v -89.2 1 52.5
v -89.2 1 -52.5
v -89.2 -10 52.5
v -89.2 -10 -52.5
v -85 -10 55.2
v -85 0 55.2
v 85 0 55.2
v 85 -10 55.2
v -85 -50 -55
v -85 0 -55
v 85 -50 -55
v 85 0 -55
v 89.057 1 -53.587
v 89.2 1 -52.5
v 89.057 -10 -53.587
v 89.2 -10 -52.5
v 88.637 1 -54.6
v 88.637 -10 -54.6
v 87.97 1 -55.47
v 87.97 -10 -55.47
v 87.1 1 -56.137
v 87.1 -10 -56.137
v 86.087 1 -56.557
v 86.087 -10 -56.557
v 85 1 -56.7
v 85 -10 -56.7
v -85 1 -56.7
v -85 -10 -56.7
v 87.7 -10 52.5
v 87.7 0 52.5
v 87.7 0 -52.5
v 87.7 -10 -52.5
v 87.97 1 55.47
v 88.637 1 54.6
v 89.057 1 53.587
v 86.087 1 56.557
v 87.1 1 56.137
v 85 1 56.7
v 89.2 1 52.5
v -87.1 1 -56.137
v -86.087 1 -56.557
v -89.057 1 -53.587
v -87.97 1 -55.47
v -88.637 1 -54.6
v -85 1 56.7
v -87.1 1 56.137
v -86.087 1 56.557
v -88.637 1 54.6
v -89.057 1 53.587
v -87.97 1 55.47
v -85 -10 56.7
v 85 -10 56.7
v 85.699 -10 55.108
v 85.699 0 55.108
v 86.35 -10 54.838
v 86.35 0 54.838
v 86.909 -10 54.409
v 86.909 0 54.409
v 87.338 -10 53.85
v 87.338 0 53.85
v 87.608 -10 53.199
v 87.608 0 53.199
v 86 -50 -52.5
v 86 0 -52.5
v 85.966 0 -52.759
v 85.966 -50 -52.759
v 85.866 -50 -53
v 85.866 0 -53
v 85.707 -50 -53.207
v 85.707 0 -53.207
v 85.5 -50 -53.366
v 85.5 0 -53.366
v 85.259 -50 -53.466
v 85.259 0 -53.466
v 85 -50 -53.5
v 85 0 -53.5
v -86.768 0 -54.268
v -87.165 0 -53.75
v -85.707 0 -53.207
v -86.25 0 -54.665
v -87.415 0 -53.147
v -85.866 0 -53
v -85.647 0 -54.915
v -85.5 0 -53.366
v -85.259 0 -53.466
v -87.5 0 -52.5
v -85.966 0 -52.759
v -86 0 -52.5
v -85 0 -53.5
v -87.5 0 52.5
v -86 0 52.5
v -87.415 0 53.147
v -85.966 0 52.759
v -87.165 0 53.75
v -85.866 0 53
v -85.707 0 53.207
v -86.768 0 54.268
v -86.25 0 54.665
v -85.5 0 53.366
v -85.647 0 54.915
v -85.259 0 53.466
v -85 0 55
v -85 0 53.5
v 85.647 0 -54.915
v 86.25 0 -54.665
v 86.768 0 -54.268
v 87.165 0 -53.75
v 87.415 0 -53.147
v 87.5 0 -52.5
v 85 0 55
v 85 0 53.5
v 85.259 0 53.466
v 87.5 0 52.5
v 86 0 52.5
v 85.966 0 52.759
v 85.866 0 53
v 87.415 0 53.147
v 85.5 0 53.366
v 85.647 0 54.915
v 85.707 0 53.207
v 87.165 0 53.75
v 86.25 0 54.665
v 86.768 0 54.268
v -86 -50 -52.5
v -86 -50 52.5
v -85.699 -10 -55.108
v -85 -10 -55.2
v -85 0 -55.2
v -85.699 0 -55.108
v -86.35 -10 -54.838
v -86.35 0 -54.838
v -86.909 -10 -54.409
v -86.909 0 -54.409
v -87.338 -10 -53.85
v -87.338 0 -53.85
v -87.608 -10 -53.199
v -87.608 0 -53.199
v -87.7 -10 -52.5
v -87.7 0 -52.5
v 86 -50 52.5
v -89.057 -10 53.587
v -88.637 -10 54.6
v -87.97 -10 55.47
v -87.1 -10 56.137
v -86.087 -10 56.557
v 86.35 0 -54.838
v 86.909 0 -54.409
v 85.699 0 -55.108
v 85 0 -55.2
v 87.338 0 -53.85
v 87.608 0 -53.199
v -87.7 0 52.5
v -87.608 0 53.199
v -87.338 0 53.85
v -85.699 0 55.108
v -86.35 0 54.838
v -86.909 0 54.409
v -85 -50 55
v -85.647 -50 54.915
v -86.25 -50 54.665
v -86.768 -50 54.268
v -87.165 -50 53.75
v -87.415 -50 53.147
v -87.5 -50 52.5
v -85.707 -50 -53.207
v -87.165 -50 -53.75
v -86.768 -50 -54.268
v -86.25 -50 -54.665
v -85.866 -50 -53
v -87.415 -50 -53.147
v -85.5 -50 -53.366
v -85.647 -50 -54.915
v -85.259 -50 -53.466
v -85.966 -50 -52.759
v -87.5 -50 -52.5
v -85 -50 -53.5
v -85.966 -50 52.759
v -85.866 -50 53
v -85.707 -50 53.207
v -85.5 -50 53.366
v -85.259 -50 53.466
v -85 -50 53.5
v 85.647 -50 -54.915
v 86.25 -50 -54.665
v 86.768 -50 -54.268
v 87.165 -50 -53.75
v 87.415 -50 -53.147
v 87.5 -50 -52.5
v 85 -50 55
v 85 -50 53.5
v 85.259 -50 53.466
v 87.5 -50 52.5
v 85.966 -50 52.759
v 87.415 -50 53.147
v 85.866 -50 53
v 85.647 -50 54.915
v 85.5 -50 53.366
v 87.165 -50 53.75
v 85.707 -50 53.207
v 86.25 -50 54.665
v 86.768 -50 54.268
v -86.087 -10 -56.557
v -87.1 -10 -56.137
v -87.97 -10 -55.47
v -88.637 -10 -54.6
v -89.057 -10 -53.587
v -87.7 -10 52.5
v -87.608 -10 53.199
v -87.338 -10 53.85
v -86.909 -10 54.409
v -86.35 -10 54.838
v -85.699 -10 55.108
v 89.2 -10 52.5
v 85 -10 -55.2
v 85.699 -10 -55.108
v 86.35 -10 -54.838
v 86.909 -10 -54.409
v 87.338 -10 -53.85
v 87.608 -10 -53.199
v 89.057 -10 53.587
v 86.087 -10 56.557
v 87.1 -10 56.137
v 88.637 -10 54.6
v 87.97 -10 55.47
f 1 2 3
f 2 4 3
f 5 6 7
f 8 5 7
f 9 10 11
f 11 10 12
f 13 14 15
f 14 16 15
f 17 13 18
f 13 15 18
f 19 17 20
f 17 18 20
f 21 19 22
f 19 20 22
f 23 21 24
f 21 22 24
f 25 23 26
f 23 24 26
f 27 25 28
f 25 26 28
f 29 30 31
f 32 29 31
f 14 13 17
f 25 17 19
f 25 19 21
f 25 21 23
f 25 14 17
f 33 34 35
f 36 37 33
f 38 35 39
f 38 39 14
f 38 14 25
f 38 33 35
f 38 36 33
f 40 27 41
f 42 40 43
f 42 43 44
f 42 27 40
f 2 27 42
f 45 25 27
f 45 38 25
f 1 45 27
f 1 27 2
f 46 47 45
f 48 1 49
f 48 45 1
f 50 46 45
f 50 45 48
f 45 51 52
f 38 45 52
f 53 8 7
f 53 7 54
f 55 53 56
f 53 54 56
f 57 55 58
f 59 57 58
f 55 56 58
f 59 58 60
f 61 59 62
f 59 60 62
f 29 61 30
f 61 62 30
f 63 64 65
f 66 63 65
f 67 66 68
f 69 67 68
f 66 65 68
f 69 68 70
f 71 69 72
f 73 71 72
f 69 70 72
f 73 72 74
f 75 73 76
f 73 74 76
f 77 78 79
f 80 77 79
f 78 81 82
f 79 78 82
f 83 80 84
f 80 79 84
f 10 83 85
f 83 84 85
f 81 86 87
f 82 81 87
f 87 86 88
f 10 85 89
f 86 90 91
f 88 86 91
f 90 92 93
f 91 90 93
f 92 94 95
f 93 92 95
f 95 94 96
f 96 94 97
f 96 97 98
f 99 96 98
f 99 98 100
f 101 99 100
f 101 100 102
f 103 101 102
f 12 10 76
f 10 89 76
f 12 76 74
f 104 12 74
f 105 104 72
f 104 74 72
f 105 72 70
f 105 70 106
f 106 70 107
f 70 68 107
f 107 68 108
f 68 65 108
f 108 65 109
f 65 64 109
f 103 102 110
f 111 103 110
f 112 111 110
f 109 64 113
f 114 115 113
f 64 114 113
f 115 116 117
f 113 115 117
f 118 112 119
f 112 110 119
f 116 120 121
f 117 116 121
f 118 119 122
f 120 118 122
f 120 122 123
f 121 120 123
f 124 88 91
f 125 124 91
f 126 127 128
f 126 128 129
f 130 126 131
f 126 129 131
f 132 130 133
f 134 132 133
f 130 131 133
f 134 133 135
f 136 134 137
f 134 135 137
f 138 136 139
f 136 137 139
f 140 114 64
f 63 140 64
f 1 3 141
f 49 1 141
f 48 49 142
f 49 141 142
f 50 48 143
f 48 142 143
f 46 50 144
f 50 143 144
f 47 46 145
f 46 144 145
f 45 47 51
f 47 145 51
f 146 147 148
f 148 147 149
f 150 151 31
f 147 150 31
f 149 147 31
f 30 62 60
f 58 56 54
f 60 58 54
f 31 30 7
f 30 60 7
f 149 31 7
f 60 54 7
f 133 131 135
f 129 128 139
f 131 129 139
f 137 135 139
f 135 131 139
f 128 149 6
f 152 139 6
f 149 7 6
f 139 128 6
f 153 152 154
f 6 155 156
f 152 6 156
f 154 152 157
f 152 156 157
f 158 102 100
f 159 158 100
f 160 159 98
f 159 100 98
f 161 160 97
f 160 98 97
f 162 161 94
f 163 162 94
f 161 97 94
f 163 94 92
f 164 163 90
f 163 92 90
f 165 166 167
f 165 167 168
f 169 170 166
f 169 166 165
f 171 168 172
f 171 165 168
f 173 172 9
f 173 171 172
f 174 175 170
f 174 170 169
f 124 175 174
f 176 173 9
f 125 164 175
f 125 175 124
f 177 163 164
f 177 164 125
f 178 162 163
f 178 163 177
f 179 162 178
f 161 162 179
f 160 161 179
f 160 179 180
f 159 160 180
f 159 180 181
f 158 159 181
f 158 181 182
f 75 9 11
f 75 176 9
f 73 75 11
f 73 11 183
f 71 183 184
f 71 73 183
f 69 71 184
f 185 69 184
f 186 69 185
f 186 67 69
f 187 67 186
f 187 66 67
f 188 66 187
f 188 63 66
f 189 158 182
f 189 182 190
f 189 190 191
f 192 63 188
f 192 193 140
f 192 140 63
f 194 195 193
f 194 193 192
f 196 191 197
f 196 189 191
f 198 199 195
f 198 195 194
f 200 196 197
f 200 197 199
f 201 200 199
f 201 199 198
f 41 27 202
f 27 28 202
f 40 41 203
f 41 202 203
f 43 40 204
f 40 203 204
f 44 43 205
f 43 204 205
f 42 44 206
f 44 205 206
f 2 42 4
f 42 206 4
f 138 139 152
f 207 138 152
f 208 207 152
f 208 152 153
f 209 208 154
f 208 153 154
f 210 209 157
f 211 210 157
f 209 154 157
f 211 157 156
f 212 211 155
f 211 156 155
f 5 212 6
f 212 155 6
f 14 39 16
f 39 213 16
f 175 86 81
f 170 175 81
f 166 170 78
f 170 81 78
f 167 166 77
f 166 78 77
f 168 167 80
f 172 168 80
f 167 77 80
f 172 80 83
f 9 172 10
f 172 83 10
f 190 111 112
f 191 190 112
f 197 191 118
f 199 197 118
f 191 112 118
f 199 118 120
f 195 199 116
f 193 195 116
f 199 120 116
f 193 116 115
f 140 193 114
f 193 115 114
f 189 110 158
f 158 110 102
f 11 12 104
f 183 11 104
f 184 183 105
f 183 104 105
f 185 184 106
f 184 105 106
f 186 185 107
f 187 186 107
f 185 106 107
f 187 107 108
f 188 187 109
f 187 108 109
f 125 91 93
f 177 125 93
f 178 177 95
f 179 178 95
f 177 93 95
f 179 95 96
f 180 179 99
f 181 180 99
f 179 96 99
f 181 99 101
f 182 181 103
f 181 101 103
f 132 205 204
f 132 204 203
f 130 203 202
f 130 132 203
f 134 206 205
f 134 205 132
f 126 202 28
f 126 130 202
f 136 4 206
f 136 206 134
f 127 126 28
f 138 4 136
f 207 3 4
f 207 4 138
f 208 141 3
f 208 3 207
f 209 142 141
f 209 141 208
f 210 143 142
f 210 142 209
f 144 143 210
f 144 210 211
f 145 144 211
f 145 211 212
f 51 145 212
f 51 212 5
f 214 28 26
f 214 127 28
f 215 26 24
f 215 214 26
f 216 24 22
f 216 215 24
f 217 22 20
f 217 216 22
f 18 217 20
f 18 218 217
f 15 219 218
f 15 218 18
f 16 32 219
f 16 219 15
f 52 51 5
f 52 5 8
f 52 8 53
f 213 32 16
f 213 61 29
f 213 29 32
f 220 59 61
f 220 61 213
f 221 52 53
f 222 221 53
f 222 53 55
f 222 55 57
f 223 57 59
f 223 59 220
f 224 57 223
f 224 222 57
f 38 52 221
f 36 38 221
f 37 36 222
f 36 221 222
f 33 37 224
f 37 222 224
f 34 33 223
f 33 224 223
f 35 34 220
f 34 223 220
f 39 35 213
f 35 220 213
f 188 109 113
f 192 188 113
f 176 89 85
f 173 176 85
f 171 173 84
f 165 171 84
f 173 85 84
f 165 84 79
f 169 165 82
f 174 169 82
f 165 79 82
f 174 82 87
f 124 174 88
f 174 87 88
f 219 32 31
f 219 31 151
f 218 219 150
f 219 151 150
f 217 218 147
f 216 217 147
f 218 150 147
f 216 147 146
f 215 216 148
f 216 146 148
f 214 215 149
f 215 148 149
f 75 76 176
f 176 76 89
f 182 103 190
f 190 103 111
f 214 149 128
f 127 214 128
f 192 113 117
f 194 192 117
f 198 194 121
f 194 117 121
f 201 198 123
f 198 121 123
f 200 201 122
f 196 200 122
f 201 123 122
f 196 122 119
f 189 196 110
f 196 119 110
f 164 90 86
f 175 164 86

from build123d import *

# Parameters (mm, degrees)
F3_DEPTH = 50
F5_DEPTH = 10
F7_DEPTH = 1


with BuildPart() as f3:
    # F2 (on Front) → F3 (new body)
    with BuildSketch(Plane.XZ):
        with BuildLine():
            Line((87.5, -52.5), (87.5, 52.5))
            ThreePointArc((87.5, 52.5), (86.767766953, 54.267766953), (85, 55))
            Line((85, 55), (-85, 55))
            ThreePointArc((-85, 55), (-86.767766953, 54.267766953), (-87.5, 52.5))
            Line((-87.5, 52.5), (-87.5, -52.5))
            ThreePointArc((-87.5, -52.5), (-86.767766953, -54.267766953), (-85, -55))
            Line((-85, -55), (85, -55))
            ThreePointArc((85, -55), (86.767766953, -54.267766953), (87.5, -52.5))
        make_face()
        with BuildLine():
            ThreePointArc((-86, 52.5), (-85.7071067812, 53.2071067812), (-85, 53.5))
            Line((-85, 53.5), (85, 53.5))
            ThreePointArc((85, 53.5), (85.7071067812, 53.2071067812), (86, 52.5))
            Line((86, 52.5), (86, -52.5))
            ThreePointArc((86, -52.5), (85.7071067812, -53.2071067812), (85, -53.5))
            Line((85, -53.5), (-85, -53.5))
            ThreePointArc((-85, -53.5), (-85.7071067812, -53.2071067812), (-86, -52.5))
            Line((-86, -52.5), (-86, 52.5))
        make_face(mode=Mode.SUBTRACT)
    extrude(amount=F3_DEPTH)


with BuildPart() as f5:
    # F4 (on Front) → F5 (new body)
    with BuildSketch(Plane.XZ):
        with BuildLine():
            ThreePointArc((-89.2, -52.5), (-87.969848481, -55.469848481), (-85, -56.7))
            Line((-85, -56.7), (85, -56.7))
            ThreePointArc((85, -56.7), (87.969848481, -55.469848481), (89.2, -52.5))
            Line((89.2, -52.5), (89.2, 52.5))
            ThreePointArc((89.2, 52.5), (87.969848481, 55.469848481), (85, 56.7))
            Line((85, 56.7), (-85, 56.7))
            ThreePointArc((-85, 56.7), (-87.969848481, 55.469848481), (-89.2, 52.5))
            Line((-89.2, 52.5), (-89.2, -52.5))
        make_face()
        with BuildLine():
            Line((85, -55.2), (-85, -55.2))
            ThreePointArc((-85, -55.2), (-86.9091883092, -54.4091883092), (-87.7, -52.5))
            Line((-87.7, -52.5), (-87.7, 52.5))
            ThreePointArc((-87.7, 52.5), (-86.9091883092, 54.4091883092), (-85, 55.2))
            Line((-85, 55.2), (85, 55.2))
            ThreePointArc((85, 55.2), (86.9091883092, 54.4091883092), (87.7, 52.5))
            Line((87.7, 52.5), (87.7, -52.5))
            ThreePointArc((87.7, -52.5), (86.9091883092, -54.4091883092), (85, -55.2))
        make_face(mode=Mode.SUBTRACT)
    extrude(amount=F5_DEPTH)

    # F6 (on face) → F7 (join)
    with BuildSketch(Plane(origin=(0, 0, 0), x_dir=(-1, 0, 0), z_dir=(0, 1, 0))):
        with BuildLine():
            ThreePointArc((-85, 56.7), (-87.969848481, 55.469848481), (-89.2, 52.5))
            Line((-89.2, 52.5), (-89.2, -52.5))
            ThreePointArc((-89.2, -52.5), (-87.969848481, -55.469848481), (-85, -56.7))
            Line((-85, -56.7), (85, -56.7))
            ThreePointArc((85, -56.7), (87.969848481, -55.469848481), (89.2, -52.5))
            Line((89.2, -52.5), (89.2, 52.5))
            ThreePointArc((89.2, 52.5), (87.969848481, 55.469848481), (85, 56.7))
            Line((85, 56.7), (-85, 56.7))
        make_face()
    extrude(amount=F7_DEPTH)


solid = Compound([f3.part, f5.part])
